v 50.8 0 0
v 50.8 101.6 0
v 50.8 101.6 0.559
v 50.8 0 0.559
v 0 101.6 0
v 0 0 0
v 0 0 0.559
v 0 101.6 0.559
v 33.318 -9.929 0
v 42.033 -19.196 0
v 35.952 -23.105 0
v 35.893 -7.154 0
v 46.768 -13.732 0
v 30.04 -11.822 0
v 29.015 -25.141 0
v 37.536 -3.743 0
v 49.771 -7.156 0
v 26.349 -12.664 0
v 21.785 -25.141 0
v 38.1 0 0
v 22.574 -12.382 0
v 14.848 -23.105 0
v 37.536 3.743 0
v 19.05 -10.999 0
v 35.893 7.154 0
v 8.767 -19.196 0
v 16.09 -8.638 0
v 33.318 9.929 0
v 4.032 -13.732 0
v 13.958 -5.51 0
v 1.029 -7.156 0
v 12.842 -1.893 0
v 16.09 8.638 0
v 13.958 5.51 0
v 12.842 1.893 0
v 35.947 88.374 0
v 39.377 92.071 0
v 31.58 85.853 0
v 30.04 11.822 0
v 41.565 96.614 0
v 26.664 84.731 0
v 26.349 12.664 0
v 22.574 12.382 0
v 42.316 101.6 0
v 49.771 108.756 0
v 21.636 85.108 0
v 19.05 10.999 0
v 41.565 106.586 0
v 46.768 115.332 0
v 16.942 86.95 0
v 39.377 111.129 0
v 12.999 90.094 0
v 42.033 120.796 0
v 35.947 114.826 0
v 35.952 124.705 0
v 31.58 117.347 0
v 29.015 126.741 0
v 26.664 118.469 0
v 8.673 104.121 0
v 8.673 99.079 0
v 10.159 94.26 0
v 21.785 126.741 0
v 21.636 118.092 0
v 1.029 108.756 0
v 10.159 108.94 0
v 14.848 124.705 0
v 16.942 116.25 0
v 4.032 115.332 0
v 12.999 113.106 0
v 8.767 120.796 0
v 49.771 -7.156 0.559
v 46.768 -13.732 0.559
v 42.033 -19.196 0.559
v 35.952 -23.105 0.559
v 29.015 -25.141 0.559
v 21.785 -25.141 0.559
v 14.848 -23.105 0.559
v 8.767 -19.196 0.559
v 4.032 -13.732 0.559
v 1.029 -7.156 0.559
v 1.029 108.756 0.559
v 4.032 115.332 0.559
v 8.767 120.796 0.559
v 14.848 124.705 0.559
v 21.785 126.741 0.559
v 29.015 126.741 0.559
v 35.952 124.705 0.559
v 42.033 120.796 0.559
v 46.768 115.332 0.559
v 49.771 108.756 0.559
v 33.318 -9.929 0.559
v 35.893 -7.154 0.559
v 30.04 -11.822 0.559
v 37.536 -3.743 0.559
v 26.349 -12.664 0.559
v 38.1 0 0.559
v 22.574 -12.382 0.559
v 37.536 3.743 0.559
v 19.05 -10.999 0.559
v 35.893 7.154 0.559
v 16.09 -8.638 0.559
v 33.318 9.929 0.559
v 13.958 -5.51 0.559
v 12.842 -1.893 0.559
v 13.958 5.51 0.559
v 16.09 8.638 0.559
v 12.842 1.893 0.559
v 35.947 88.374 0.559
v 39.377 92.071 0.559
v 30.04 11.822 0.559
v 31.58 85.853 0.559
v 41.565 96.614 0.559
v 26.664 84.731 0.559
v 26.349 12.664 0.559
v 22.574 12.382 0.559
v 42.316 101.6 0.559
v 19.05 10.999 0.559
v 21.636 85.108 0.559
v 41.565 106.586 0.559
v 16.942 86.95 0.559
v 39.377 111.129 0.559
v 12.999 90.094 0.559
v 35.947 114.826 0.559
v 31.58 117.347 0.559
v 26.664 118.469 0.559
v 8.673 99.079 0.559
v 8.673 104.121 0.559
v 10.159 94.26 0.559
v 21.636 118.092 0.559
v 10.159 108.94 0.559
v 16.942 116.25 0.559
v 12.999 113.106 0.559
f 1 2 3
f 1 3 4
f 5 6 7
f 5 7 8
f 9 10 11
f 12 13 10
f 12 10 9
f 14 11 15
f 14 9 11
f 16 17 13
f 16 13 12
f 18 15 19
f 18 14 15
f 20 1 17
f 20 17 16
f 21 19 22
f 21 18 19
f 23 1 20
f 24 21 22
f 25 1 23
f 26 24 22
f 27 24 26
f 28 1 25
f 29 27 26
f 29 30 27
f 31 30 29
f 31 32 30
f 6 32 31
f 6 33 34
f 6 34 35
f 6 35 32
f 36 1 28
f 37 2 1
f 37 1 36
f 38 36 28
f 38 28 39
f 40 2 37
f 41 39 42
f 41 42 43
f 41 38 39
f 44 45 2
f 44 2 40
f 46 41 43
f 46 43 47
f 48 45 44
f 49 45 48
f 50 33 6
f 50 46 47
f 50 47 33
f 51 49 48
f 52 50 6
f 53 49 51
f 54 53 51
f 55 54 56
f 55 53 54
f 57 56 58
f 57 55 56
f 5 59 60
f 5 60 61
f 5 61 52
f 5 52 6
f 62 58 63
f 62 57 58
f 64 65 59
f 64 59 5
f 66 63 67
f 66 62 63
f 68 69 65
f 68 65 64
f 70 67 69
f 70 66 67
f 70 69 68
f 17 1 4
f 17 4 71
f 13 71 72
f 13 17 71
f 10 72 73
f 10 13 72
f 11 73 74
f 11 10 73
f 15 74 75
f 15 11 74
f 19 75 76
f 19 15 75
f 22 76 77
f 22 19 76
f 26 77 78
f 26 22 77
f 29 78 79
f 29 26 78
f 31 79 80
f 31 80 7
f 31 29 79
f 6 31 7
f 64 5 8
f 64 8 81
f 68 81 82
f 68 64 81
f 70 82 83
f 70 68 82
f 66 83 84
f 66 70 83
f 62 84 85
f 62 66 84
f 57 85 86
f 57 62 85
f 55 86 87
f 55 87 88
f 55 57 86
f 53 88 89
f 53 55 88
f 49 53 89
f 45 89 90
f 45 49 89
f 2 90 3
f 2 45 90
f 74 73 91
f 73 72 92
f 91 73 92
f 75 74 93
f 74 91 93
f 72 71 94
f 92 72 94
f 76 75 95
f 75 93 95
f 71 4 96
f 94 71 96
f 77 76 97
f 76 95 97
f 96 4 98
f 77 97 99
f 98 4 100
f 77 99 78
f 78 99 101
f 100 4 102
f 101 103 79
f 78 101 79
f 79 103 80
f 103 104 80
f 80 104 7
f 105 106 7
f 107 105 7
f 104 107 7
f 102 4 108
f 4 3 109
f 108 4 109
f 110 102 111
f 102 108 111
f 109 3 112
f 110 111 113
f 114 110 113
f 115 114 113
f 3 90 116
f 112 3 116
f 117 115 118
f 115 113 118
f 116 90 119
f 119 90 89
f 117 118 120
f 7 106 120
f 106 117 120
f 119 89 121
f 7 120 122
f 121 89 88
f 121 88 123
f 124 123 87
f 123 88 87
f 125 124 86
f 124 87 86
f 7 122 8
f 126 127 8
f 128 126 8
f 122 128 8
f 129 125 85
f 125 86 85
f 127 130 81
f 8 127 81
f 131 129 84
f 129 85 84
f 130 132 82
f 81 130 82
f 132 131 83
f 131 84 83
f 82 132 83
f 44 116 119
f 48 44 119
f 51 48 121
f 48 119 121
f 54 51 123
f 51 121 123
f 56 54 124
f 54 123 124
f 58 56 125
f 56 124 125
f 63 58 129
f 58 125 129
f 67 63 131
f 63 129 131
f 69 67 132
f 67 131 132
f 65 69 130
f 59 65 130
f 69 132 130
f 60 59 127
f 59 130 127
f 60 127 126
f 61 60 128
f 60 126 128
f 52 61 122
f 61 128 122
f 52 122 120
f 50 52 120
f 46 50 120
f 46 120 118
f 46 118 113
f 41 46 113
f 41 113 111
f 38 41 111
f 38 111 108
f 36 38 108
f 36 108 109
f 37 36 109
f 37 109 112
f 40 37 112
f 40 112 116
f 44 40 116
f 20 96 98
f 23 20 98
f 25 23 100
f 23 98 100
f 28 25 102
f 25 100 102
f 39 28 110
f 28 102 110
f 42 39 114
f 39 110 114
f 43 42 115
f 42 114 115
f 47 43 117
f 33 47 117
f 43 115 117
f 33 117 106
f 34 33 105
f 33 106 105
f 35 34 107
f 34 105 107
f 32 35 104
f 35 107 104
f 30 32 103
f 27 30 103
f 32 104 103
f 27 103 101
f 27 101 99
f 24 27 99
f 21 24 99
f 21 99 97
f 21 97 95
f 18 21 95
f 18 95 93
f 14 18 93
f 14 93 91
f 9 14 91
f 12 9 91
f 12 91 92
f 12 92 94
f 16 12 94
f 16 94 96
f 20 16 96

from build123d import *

# Parameters (mm, degrees)
BOSS_EXTRUDE1_DEPTH = 0.5588
SKETCH2_R           = 16.9164
SKETCH2_R_2         = 12.7
CUT_EXTRUDE1_DEPTH  = 137.784327529


with BuildPart() as part:
    # Sketch1 → Boss-Extrude1 (new body)
    with BuildSketch(Plane.XY):
        with BuildLine():
            Line((0, 0), (0, 101.6))
            ThreePointArc((0, 101.6), (25.4, 127), (50.8, 101.6))
            Line((50.8, 101.6), (50.8, 0))
            ThreePointArc((50.8, 0), (25.4, -25.4), (0, 0))
        make_face()
    extrude(amount=BOSS_EXTRUDE1_DEPTH)

    # Sketch2 → Cut-Extrude1 (cut, through all)
    with BuildSketch(Plane.XY.offset(0.5588)):
        with Locations((25.4, 101.6)):
            Circle(SKETCH2_R)
        with Locations((25.4, 0)):
            Circle(SKETCH2_R_2)
    extrude(amount=-CUT_EXTRUDE1_DEPTH, mode=Mode.SUBTRACT)


solid = part.part
